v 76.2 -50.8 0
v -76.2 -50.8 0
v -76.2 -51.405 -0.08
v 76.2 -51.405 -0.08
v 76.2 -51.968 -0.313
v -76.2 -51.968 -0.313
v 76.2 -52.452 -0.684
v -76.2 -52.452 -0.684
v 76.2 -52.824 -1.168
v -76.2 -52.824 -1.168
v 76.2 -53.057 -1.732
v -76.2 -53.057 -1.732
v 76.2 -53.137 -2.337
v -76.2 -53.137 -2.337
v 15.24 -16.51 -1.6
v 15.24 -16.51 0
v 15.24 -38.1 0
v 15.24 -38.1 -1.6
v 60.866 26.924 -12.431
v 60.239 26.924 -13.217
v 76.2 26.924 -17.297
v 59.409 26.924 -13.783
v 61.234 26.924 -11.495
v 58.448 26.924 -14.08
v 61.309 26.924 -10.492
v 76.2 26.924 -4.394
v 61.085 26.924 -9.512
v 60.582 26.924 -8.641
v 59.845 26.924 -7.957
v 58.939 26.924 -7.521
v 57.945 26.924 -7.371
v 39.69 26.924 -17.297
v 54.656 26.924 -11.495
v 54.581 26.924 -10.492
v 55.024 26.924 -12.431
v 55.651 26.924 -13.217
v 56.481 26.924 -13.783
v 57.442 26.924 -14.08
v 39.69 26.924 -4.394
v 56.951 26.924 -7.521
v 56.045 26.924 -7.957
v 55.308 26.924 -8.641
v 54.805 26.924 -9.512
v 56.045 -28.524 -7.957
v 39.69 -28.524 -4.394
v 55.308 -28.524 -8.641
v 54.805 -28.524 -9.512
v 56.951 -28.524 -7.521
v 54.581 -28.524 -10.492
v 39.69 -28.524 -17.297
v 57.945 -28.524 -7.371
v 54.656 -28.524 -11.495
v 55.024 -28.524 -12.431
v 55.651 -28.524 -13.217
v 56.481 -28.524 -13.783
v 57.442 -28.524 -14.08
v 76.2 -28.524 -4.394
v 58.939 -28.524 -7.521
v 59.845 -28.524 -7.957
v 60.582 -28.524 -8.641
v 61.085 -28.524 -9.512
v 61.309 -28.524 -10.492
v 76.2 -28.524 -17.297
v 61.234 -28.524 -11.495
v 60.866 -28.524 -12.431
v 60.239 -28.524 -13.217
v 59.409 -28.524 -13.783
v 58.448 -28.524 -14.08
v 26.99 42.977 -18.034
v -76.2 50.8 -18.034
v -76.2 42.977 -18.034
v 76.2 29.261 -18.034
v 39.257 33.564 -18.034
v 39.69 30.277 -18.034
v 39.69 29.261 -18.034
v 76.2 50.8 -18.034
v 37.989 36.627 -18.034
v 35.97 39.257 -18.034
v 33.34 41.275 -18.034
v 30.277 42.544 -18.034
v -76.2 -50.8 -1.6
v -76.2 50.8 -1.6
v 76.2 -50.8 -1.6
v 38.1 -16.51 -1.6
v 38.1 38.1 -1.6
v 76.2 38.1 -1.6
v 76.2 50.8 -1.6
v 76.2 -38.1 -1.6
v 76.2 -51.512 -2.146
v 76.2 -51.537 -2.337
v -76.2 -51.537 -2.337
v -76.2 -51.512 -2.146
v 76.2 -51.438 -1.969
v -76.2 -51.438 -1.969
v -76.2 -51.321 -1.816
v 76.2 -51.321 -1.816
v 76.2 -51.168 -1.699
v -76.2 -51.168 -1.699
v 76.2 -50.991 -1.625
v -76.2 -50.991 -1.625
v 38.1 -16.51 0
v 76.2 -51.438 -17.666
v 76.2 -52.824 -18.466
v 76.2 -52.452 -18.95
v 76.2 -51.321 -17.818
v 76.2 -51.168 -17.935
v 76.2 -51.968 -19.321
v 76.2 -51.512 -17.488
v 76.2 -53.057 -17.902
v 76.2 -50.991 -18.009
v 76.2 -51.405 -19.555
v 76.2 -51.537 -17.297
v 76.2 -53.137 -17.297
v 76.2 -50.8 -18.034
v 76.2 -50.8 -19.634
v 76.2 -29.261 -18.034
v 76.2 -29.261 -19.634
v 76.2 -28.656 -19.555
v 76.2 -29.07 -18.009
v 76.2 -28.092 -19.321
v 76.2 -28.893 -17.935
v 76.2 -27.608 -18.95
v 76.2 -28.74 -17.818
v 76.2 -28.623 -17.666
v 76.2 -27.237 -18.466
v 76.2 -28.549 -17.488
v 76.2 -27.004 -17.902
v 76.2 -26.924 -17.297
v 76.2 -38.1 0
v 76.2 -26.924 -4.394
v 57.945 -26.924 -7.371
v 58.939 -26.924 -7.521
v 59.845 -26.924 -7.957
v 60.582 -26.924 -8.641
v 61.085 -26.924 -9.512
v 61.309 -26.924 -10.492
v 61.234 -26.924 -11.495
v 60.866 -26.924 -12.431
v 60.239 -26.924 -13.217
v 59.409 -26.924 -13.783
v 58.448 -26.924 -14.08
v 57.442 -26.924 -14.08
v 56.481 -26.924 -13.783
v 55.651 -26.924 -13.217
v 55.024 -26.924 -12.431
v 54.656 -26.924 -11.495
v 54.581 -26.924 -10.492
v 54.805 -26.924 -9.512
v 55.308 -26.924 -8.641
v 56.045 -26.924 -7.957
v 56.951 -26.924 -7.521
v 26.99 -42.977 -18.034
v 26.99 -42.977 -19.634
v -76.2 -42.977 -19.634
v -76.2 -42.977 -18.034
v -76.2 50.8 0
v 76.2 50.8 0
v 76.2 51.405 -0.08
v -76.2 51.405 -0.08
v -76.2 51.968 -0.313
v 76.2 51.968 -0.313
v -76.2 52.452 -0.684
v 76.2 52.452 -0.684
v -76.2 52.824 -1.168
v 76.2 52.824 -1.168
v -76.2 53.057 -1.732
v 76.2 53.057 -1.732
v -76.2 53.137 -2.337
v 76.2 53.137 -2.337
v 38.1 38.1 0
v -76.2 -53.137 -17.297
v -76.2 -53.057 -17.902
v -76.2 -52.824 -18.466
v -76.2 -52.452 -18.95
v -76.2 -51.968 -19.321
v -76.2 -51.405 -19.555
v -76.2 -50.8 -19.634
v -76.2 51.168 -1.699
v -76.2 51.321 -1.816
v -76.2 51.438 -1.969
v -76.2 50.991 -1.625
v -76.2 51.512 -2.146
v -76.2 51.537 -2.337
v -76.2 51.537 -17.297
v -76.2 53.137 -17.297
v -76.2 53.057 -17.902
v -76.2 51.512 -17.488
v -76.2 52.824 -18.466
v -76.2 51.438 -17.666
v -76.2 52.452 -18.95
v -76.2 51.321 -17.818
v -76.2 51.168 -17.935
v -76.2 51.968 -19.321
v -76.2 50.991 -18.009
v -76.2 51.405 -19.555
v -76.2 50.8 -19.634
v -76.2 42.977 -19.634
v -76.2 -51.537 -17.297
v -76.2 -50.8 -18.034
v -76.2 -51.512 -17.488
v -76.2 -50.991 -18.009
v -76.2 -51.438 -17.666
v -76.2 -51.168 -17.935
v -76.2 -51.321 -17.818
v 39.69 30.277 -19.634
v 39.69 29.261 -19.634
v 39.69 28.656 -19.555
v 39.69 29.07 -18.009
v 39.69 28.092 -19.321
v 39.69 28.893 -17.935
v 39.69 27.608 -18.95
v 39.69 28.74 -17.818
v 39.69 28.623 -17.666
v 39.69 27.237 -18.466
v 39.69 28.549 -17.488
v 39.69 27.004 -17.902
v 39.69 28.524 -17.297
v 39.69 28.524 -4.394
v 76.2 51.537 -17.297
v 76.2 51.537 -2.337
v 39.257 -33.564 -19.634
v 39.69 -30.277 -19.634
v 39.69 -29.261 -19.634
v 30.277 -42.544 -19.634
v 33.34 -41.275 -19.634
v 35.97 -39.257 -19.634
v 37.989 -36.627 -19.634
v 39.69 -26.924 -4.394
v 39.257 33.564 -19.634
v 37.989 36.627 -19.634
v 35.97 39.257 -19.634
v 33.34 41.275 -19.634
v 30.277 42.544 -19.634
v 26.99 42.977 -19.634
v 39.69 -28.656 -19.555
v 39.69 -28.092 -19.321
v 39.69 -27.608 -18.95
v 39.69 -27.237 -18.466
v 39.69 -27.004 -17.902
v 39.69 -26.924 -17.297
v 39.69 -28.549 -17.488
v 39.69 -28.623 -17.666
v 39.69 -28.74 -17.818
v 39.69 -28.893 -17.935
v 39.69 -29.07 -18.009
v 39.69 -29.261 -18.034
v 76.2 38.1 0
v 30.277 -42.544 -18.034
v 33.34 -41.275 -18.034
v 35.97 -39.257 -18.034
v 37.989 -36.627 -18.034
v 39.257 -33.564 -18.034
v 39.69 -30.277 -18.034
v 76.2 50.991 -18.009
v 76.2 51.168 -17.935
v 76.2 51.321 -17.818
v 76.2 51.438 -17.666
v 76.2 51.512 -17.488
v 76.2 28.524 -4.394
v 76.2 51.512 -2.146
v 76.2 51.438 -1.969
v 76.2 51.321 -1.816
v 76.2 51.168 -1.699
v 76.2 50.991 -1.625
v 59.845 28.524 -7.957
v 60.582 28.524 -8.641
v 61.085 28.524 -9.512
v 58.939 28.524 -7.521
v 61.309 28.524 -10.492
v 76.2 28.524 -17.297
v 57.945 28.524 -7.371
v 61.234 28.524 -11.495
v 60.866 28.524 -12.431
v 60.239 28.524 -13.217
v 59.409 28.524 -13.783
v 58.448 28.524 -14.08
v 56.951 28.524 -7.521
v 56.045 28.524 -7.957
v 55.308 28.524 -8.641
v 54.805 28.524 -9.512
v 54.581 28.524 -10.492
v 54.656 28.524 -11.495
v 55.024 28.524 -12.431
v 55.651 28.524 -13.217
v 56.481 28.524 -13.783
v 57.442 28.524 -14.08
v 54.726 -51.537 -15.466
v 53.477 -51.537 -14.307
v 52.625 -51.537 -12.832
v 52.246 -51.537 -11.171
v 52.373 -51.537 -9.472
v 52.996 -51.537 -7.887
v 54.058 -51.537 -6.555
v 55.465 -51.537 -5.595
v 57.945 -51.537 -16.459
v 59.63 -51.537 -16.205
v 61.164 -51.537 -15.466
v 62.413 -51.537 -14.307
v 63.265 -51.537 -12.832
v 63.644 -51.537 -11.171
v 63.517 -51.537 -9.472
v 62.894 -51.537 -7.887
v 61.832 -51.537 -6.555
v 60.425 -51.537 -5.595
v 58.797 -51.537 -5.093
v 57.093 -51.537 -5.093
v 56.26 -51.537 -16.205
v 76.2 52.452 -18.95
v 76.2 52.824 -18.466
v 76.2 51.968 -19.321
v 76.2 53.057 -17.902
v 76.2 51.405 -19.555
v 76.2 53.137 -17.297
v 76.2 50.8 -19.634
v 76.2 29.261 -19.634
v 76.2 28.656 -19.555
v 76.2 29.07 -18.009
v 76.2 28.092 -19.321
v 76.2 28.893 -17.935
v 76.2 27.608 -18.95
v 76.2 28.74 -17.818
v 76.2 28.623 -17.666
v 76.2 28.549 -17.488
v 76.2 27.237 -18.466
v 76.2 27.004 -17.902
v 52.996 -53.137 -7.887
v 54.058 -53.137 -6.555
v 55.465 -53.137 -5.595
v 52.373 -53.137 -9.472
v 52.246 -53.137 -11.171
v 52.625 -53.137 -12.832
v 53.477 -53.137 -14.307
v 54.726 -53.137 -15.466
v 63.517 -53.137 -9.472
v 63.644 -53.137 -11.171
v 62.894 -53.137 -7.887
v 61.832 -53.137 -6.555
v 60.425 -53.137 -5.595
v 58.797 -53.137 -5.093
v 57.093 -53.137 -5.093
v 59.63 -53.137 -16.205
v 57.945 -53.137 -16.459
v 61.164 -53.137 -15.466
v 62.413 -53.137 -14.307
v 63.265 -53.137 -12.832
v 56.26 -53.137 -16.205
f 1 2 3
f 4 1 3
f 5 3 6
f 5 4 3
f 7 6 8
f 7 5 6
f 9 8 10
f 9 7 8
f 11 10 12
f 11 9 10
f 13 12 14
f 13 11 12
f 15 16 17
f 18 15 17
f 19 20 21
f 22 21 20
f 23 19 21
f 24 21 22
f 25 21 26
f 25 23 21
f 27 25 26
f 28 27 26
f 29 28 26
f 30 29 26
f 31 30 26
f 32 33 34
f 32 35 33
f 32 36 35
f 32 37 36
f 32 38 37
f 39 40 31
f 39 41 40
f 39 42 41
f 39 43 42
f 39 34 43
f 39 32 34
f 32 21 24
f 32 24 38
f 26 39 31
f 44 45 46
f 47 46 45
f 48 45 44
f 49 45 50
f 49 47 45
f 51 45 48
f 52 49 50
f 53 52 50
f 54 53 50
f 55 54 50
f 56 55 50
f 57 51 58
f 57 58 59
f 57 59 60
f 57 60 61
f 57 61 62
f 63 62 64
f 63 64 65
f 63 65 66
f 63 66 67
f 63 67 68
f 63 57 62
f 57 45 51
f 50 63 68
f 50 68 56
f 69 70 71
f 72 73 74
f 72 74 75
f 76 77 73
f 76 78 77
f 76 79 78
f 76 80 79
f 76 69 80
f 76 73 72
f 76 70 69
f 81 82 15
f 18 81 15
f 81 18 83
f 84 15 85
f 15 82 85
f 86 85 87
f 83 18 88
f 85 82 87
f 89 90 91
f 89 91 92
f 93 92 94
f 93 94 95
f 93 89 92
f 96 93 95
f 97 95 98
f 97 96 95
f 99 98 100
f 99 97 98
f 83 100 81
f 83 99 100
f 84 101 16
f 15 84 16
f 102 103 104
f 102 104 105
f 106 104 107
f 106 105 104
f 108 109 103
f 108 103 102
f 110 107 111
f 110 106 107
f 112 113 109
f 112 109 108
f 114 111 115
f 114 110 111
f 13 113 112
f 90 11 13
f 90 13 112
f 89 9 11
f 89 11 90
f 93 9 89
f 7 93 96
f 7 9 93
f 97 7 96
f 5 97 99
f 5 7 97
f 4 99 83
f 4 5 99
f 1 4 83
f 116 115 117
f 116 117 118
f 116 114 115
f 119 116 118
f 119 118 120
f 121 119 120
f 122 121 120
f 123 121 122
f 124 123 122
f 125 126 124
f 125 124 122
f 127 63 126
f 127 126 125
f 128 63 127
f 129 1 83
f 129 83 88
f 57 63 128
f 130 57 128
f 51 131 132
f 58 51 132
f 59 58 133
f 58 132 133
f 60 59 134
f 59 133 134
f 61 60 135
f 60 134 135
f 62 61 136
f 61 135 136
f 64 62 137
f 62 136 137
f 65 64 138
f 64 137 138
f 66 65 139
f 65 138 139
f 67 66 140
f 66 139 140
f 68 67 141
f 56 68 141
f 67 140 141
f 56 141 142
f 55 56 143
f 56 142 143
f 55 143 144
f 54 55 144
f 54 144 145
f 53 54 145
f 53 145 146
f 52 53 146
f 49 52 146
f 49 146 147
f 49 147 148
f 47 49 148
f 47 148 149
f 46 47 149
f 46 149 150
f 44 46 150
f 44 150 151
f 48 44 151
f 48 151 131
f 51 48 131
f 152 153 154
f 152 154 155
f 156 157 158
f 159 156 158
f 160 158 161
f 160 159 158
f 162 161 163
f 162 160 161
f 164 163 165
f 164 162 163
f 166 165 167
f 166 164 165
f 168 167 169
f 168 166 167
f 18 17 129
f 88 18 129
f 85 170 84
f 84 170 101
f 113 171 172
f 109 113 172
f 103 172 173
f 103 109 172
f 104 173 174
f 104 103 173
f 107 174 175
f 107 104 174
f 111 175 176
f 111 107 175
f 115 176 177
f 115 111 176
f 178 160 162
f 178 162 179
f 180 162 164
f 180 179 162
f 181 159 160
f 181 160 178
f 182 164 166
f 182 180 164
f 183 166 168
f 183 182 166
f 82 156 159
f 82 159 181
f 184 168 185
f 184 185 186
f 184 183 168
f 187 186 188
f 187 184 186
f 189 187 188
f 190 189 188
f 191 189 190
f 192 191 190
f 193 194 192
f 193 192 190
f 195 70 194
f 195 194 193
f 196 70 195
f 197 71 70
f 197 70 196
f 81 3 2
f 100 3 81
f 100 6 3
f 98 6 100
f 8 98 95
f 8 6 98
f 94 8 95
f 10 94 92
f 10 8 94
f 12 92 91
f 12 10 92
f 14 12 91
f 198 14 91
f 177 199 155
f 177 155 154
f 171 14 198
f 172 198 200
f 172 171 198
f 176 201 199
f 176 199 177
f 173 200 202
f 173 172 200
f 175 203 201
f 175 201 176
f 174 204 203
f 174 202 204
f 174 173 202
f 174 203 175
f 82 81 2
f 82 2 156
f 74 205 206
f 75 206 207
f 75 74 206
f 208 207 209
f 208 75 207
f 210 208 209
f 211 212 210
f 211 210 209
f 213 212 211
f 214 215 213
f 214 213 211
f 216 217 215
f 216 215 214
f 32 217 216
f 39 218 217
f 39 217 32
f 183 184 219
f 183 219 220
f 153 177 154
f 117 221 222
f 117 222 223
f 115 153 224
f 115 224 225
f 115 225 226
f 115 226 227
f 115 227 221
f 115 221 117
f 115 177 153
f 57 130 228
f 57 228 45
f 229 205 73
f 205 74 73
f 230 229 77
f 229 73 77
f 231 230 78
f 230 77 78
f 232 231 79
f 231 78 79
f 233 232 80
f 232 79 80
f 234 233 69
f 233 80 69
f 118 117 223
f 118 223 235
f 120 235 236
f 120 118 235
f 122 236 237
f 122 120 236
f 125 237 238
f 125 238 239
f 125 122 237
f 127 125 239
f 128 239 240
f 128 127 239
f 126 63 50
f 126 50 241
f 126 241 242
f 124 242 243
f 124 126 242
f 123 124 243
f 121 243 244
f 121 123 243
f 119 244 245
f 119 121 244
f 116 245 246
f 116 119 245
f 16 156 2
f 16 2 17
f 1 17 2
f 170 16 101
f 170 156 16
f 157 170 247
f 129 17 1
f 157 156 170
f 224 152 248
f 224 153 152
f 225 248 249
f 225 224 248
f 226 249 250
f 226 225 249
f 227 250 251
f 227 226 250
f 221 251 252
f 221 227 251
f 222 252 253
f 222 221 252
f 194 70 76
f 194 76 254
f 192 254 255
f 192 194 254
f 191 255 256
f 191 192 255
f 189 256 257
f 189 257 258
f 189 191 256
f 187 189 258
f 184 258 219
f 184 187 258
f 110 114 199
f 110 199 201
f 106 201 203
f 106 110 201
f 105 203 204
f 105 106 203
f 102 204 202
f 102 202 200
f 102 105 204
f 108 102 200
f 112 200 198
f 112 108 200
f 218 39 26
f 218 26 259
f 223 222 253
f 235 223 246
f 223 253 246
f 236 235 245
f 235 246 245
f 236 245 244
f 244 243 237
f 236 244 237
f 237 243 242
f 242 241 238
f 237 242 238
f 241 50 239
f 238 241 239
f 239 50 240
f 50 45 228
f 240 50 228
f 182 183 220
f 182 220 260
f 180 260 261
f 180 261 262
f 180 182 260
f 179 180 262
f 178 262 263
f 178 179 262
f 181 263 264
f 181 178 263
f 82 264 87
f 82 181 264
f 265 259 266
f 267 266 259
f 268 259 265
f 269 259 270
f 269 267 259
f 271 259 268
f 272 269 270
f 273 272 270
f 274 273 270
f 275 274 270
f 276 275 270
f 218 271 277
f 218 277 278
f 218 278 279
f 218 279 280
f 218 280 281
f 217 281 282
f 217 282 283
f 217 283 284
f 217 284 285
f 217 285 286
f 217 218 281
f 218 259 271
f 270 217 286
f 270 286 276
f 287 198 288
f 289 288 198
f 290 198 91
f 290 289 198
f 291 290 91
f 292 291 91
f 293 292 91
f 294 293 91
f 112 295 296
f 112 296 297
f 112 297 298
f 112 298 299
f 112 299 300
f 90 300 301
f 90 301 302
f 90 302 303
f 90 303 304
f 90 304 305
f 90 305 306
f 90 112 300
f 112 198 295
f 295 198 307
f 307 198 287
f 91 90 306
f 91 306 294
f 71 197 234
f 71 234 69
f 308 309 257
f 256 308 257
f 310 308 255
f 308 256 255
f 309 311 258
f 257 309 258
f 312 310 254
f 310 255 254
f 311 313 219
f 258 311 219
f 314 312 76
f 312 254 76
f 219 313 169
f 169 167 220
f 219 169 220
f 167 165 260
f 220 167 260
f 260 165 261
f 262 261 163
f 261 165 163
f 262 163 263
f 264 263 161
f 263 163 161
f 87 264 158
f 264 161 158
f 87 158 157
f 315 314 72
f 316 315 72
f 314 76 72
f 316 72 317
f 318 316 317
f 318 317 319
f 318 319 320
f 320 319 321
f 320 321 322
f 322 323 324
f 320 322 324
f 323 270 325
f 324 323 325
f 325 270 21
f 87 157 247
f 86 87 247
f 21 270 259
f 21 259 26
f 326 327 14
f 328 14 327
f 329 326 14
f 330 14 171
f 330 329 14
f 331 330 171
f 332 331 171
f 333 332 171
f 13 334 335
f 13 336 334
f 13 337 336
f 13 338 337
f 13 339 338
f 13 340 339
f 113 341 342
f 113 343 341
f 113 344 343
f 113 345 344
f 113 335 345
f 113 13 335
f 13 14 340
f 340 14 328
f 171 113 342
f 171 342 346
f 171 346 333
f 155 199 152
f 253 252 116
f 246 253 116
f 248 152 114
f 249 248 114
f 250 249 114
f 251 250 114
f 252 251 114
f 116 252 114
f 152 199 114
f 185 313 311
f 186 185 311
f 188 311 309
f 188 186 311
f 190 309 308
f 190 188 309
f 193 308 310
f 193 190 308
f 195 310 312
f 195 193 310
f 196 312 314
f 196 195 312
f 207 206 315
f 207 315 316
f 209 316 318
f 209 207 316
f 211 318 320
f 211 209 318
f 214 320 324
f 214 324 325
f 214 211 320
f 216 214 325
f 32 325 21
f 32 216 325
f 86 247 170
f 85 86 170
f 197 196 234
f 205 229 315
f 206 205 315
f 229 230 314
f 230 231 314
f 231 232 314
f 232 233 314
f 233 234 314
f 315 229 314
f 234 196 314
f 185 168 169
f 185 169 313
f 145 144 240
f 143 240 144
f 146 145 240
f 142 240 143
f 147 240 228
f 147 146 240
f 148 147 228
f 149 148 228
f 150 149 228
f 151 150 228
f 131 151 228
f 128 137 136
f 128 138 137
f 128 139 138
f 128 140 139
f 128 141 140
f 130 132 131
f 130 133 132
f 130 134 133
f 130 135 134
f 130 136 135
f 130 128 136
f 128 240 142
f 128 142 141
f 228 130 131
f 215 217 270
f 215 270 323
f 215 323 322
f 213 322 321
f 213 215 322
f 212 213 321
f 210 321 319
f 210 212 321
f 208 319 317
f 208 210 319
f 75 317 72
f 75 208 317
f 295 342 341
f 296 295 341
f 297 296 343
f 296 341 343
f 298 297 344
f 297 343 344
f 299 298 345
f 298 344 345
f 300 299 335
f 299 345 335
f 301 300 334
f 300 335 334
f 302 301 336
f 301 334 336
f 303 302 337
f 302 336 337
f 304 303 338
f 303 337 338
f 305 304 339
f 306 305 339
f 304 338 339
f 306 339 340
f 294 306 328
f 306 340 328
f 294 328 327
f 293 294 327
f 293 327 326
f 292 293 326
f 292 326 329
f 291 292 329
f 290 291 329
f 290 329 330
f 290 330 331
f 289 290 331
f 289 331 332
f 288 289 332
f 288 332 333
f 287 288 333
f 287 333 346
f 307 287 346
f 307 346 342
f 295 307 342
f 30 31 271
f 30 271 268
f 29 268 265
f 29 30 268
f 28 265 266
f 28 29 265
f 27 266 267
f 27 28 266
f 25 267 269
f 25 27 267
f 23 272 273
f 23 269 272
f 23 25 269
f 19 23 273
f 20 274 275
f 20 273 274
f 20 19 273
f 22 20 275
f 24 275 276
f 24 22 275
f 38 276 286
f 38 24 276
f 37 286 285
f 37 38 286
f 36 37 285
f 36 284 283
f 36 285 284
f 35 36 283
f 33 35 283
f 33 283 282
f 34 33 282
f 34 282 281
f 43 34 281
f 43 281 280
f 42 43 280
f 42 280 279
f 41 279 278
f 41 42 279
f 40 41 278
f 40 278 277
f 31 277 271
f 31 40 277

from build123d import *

# Parameters (mm, degrees)
SKETCH1_W                      = 152.4
SKETCH1_H                      = 101.6
BASE_FLANGE1_DEPTH             = 1.6002
EDGE_FLANGE1_DEPTH             = 152.4
EDGE_FLANGE2_DEPTH             = 152.4
CUT_EXTRUDE1_DEPTH             = 95.949783169
EDGE_FLANGE7_STRIP_W           = 7.874
EDGE_FLANGE7_STRIP_H           = 1.6002
EDGE_FLANGE7_STRIP_CUT_DEPTH   = 152.4
EDGE_FLANGE7_DEPTH             = 152.4
EDGE_FLANGE8_STRIP_W           = 7.874
EDGE_FLANGE8_STRIP_H           = 1.6002
EDGE_FLANGE8_STRIP_CUT_DEPTH   = 152.4
EDGE_FLANGE8_DEPTH             = 152.4
SKETCH35_W                     = 36.50996
SKETCH35_H                     = 1.6002
BOSS_EXTRUDE1_DEPTH            = 16.0528
EDGE_FLANGE9_STRIP_W           = 7.874
EDGE_FLANGE9_STRIP_H           = 1.6002
EDGE_FLANGE9_STRIP_CUT_DEPTH   = 36.50996
EDGE_FLANGE9_DEPTH             = 36.50996
SKETCH39_W                     = 36.50996
SKETCH39_H                     = 1.6002
BOSS_EXTRUDE2_DEPTH            = 16.0528
EDGE_FLANGE10_STRIP_W          = 7.874
EDGE_FLANGE10_STRIP_H          = 1.6002
EDGE_FLANGE10_STRIP_CUT_DEPTH  = 36.50996
EDGE_FLANGE10_DEPTH            = 36.50996
CUT_EXTRUDE2_REACH             = 114.257
SKETCH43_R                     = 3.37312
CUT_EXTRUDE2_DIRECTION_2_REACH = 114.257
FILLET1_R                      = 12.7
CUT_EXTRUDE3_REACH             = 134.235
SKETCH46_R                     = 5.715


# Sheet-metal steps are written as plain solids
with BuildPart() as part:
    # Sketch1 → Base-Flange1 (new body)
    with BuildSketch(Plane.XY):
        Rectangle(SKETCH1_W, SKETCH1_H)
    extrude(amount=-BASE_FLANGE1_DEPTH)

    # Edge-Flange1 section (across the edge) → Edge-Flange1 (add)
    with BuildSketch(Plane(origin=(-76.2, 51.5366, -1.6002), x_dir=(0, -1, 0), z_dir=(1, 0, 0))):
        with BuildLine():
            Line((-1.6002, 0.7366), (-1.6002, 18.034))
            Line((-1.6002, 18.034), (0, 18.034))
            Line((0, 18.034), (0, 0.7366))
            ThreePointArc((0, 0.7366), (0.215745145, 0.215745145), (0.7366, 0))
            Line((0.7366, 0), (0.7366, -1.6002))
            ThreePointArc((0.7366, -1.6002), (-0.915767126, -0.915767126), (-1.6002, 0.7366))
        make_face()
    extrude(amount=EDGE_FLANGE1_DEPTH)

    # Edge-Flange2 section (across the edge) → Edge-Flange2 (add)
    with BuildSketch(Plane(origin=(76.2, -51.5366, -1.6002), x_dir=(0, 1, 0), z_dir=(-1, 0, 0))):
        with BuildLine():
            Line((-1.6002, 0.7366), (-1.6002, 18.034))
            Line((-1.6002, 18.034), (0, 18.034))
            Line((0, 18.034), (0, 0.7366))
            ThreePointArc((0, 0.7366), (0.215745145, 0.215745145), (0.7366, 0))
            Line((0.7366, 0), (0.7366, -1.6002))
            ThreePointArc((0.7366, -1.6002), (-0.915767126, -0.915767126), (-1.6002, 0.7366))
        make_face()
    extrude(amount=EDGE_FLANGE2_DEPTH)

    # Sketch14 → Cut-Extrude1 (cut, through all)
    with BuildSketch(Plane.XY):
        Polygon((76.2, -38.1), (76.2, 38.1), (38.1, 38.1), (38.1, -16.51), (15.24, -16.51), (15.24, -38.1), align=None)
    extrude(amount=-CUT_EXTRUDE1_DEPTH, mode=Mode.SUBTRACT)

    # Edge-Flange7 strip (across the edge) → Edge-Flange7 strip cut (cut)
    with BuildSketch(Plane(origin=(76.2, -51.5366, -19.6342), x_dir=(0, 0, 1), z_dir=(-1, 0, 0))):
        with Locations((-1.6002, -0.8001)):
            Rectangle(EDGE_FLANGE7_STRIP_W, EDGE_FLANGE7_STRIP_H)
    extrude(amount=EDGE_FLANGE7_STRIP_CUT_DEPTH, mode=Mode.SUBTRACT)

    # Edge-Flange7 section (across the edge) → Edge-Flange7 (add)
    with BuildSketch(Plane(origin=(76.2, -51.5366, -19.6342), x_dir=(0, 0, 1), z_dir=(-1, 0, 0))):
        with BuildLine():
            Line((0, 0.7366), (0, 8.5598))
            Line((0, 8.5598), (1.6002, 8.5598))
            Line((1.6002, 8.5598), (1.6002, 0.7366))
            ThreePointArc((1.6002, 0.7366), (1.815945145, 0.215745145), (2.3368, 0))
            Line((2.3368, 0), (2.3368, -1.6002))
            ThreePointArc((2.3368, -1.6002), (0.684432874, -0.915767126), (0, 0.7366))
        make_face()
    extrude(amount=EDGE_FLANGE7_DEPTH)

    # Edge-Flange8 strip (across the edge) → Edge-Flange8 strip cut (cut)
    with BuildSketch(Plane(origin=(-76.2, 51.5366, -19.6342), x_dir=(0, 0, 1), z_dir=(1, 0, 0))):
        with Locations((-1.6002, -0.8001)):
            Rectangle(EDGE_FLANGE8_STRIP_W, EDGE_FLANGE8_STRIP_H)
    extrude(amount=EDGE_FLANGE8_STRIP_CUT_DEPTH, mode=Mode.SUBTRACT)

    # Edge-Flange8 section (across the edge) → Edge-Flange8 (add)
    with BuildSketch(Plane(origin=(-76.2, 51.5366, -19.6342), x_dir=(0, 0, 1), z_dir=(1, 0, 0))):
        with BuildLine():
            Line((0, 0.7366), (0, 8.5598))
            Line((0, 8.5598), (1.6002, 8.5598))
            Line((1.6002, 8.5598), (1.6002, 0.7366))
            ThreePointArc((1.6002, 0.7366), (1.815945145, 0.215745145), (2.3368, 0))
            Line((2.3368, 0), (2.3368, -1.6002))
            ThreePointArc((2.3368, -1.6002), (0.684432874, -0.915767126), (0, 0.7366))
        make_face()
    extrude(amount=EDGE_FLANGE8_DEPTH)

    # Sketch35 → Boss-Extrude1 (add)
    with BuildSketch(Plane(origin=(0, -42.9768, 0), x_dir=(1, 0, 0), z_dir=(0, 1, 0))):
        with Locations((57.94502, 18.8341)):
            Rectangle(SKETCH35_W, SKETCH35_H)
    extrude(amount=BOSS_EXTRUDE1_DEPTH)

    # Edge-Flange9 strip (across the edge) → Edge-Flange9 strip cut (cut)
    with BuildSketch(Plane(origin=(76.2, -26.924, -18.034), x_dir=(0, -1, 0), z_dir=(-1, 0, 0))):
        with Locations((-1.6002, -0.8001)):
            Rectangle(EDGE_FLANGE9_STRIP_W, EDGE_FLANGE9_STRIP_H)
    extrude(amount=EDGE_FLANGE9_STRIP_CUT_DEPTH, mode=Mode.SUBTRACT)

    # Edge-Flange9 section (across the edge) → Edge-Flange9 (add)
    with BuildSketch(Plane(origin=(76.2, -26.924, -18.034), x_dir=(0, -1, 0), z_dir=(-1, 0, 0))):
        with BuildLine():
            Line((0, 0.7366), (0, 13.6398))
            Line((0, 13.6398), (1.6002, 13.6398))
            Line((1.6002, 13.6398), (1.6002, 0.7366))
            ThreePointArc((1.6002, 0.7366), (1.815945145, 0.215745145), (2.3368, 0))
            Line((2.3368, 0), (2.3368, -1.6002))
            ThreePointArc((2.3368, -1.6002), (0.684432874, -0.915767126), (0, 0.7366))
        make_face()
    extrude(amount=EDGE_FLANGE9_DEPTH)

    # Sketch39 → Boss-Extrude2 (add)
    with BuildSketch(Plane.XZ.offset(-42.9768)):
        with Locations((57.94502, -18.8341)):
            Rectangle(SKETCH39_W, SKETCH39_H)
    extrude(amount=BOSS_EXTRUDE2_DEPTH)

    # Edge-Flange10 strip (across the edge) → Edge-Flange10 strip cut (cut)
    with BuildSketch(Plane(origin=(39.69004, 26.924, -18.034), x_dir=(0, 1, 0), z_dir=(1, 0, 0))):
        with Locations((-1.6002, -0.8001)):
            Rectangle(EDGE_FLANGE10_STRIP_W, EDGE_FLANGE10_STRIP_H)
    extrude(amount=EDGE_FLANGE10_STRIP_CUT_DEPTH, mode=Mode.SUBTRACT)

    # Edge-Flange10 section (across the edge) → Edge-Flange10 (add)
    with BuildSketch(Plane(origin=(39.69004, 26.924, -18.034), x_dir=(0, 1, 0), z_dir=(1, 0, 0))):
        with BuildLine():
            Line((0, 0.7366), (0, 13.6398))
            Line((0, 13.6398), (1.6002, 13.6398))
            Line((1.6002, 13.6398), (1.6002, 0.7366))
            ThreePointArc((1.6002, 0.7366), (1.815945145, 0.215745145), (2.3368, 0))
            Line((2.3368, 0), (2.3368, -1.6002))
            ThreePointArc((2.3368, -1.6002), (0.684432874, -0.915767126), (0, 0.7366))
        make_face()
    extrude(amount=EDGE_FLANGE10_DEPTH)

    # Cut-Extrude2: up to this face of the body (flat: up to its plane)
    cut_extrude2_end = Plane(part.part.faces().sort_by_distance((57.94502, -28.5242, -10.8458))[0])
    # Sketch43 → Cut-Extrude2 (cut, up to the picked face)
    with BuildSketch(Plane(origin=(0, -26.924, 0), x_dir=(1, 0, 0), z_dir=(0, 1, 0)), mode=Mode.PRIVATE) as cut_extrude2_sk1:
        with Locations(Location((57.94502, 10.7442, 0), (0, 0, 270))):
            Circle(SKETCH43_R)
    cut_extrude2_tool1 = split(extrude(cut_extrude2_sk1.sketch, amount=-CUT_EXTRUDE2_REACH, mode=Mode.PRIVATE), bisect_by=cut_extrude2_end, keep=Keep.BOTH, mode=Mode.PRIVATE)
    add(cut_extrude2_tool1.solids().sort_by(Axis((57.94502, -26.924, -10.7442), (0, -1, 0)))[0], mode=Mode.SUBTRACT)

    # Cut-Extrude2 direction 2: up to this face of the body (flat: up to its plane)
    cut_extrude2_direction_2_end = Plane(part.part.faces().sort_by_distance((57.94502, 28.5242, -10.8458))[0])
    # Sketch43 → Cut-Extrude2 direction 2 (cut, up to the picked face)
    with BuildSketch(Plane(origin=(0, -26.924, 0), x_dir=(1, 0, 0), z_dir=(0, 1, 0)), mode=Mode.PRIVATE) as cut_extrude2_direction_2_sk1:
        with Locations(Location((57.94502, 10.7442, 0), (0, 0, 270))):
            Circle(SKETCH43_R)
    cut_extrude2_direction_2_tool1 = split(extrude(cut_extrude2_direction_2_sk1.sketch, amount=CUT_EXTRUDE2_DIRECTION_2_REACH, mode=Mode.PRIVATE), bisect_by=cut_extrude2_direction_2_end, keep=Keep.BOTH, mode=Mode.PRIVATE)
    add(cut_extrude2_direction_2_tool1.solids().sort_by(Axis((57.94502, -26.924, -10.7442), (0, 1, 0)))[0], mode=Mode.SUBTRACT)

    # Fillet1
    fillet1_edges = [part.edges().sort_by_distance(p)[0] for p in [
        (39.69004, -42.9768, -18.8341),
        (39.69004, 42.9768, -18.8341),
    ]]
    fillet(fillet1_edges, radius=FILLET1_R)

    # Sketch46 → Cut-Extrude3 (cut, up to next)
    with BuildSketch(Plane.XZ.offset(53.1368), mode=Mode.PRIVATE) as cut_extrude3_sk1:
        with Locations(Location((57.94502, -10.7442, 0), (0, 0, 270))):
            Circle(SKETCH46_R)
    cut_extrude3_tool1 = extrude(cut_extrude3_sk1.sketch, amount=-CUT_EXTRUDE3_REACH, mode=Mode.PRIVATE) & part.part
    add(cut_extrude3_tool1.solids().sort_by_distance((57.94502, -53.1368, -10.7442))[0], mode=Mode.SUBTRACT)


solid = part.part
